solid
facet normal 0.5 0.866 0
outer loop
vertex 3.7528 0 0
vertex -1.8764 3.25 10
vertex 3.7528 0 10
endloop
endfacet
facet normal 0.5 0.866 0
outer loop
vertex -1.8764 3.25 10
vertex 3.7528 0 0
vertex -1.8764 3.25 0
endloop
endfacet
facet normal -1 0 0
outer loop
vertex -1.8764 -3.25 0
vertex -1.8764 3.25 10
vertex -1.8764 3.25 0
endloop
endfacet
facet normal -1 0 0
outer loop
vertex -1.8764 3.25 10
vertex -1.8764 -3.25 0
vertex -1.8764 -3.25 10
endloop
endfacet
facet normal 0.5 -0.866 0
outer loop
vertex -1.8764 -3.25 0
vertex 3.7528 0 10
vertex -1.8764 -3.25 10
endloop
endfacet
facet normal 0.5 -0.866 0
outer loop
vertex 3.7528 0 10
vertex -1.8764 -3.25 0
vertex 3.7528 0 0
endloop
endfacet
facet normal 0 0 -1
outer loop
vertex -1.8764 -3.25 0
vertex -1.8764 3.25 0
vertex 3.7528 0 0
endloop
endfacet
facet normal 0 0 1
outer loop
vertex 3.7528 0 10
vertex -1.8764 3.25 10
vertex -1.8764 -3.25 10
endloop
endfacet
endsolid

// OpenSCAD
desiredEquiTriLength = 6.5;
radius = sqrt(pow(desiredEquiTriLength,2) / (2 - 2*cos(120)));

union() {
  cylinder(r=radius,h=10,$fn=3);

    %
  translate([0,0,10])
  scale([1,2,1]) 
    cylinder(r=radius,h=10,$fn=3);
}
